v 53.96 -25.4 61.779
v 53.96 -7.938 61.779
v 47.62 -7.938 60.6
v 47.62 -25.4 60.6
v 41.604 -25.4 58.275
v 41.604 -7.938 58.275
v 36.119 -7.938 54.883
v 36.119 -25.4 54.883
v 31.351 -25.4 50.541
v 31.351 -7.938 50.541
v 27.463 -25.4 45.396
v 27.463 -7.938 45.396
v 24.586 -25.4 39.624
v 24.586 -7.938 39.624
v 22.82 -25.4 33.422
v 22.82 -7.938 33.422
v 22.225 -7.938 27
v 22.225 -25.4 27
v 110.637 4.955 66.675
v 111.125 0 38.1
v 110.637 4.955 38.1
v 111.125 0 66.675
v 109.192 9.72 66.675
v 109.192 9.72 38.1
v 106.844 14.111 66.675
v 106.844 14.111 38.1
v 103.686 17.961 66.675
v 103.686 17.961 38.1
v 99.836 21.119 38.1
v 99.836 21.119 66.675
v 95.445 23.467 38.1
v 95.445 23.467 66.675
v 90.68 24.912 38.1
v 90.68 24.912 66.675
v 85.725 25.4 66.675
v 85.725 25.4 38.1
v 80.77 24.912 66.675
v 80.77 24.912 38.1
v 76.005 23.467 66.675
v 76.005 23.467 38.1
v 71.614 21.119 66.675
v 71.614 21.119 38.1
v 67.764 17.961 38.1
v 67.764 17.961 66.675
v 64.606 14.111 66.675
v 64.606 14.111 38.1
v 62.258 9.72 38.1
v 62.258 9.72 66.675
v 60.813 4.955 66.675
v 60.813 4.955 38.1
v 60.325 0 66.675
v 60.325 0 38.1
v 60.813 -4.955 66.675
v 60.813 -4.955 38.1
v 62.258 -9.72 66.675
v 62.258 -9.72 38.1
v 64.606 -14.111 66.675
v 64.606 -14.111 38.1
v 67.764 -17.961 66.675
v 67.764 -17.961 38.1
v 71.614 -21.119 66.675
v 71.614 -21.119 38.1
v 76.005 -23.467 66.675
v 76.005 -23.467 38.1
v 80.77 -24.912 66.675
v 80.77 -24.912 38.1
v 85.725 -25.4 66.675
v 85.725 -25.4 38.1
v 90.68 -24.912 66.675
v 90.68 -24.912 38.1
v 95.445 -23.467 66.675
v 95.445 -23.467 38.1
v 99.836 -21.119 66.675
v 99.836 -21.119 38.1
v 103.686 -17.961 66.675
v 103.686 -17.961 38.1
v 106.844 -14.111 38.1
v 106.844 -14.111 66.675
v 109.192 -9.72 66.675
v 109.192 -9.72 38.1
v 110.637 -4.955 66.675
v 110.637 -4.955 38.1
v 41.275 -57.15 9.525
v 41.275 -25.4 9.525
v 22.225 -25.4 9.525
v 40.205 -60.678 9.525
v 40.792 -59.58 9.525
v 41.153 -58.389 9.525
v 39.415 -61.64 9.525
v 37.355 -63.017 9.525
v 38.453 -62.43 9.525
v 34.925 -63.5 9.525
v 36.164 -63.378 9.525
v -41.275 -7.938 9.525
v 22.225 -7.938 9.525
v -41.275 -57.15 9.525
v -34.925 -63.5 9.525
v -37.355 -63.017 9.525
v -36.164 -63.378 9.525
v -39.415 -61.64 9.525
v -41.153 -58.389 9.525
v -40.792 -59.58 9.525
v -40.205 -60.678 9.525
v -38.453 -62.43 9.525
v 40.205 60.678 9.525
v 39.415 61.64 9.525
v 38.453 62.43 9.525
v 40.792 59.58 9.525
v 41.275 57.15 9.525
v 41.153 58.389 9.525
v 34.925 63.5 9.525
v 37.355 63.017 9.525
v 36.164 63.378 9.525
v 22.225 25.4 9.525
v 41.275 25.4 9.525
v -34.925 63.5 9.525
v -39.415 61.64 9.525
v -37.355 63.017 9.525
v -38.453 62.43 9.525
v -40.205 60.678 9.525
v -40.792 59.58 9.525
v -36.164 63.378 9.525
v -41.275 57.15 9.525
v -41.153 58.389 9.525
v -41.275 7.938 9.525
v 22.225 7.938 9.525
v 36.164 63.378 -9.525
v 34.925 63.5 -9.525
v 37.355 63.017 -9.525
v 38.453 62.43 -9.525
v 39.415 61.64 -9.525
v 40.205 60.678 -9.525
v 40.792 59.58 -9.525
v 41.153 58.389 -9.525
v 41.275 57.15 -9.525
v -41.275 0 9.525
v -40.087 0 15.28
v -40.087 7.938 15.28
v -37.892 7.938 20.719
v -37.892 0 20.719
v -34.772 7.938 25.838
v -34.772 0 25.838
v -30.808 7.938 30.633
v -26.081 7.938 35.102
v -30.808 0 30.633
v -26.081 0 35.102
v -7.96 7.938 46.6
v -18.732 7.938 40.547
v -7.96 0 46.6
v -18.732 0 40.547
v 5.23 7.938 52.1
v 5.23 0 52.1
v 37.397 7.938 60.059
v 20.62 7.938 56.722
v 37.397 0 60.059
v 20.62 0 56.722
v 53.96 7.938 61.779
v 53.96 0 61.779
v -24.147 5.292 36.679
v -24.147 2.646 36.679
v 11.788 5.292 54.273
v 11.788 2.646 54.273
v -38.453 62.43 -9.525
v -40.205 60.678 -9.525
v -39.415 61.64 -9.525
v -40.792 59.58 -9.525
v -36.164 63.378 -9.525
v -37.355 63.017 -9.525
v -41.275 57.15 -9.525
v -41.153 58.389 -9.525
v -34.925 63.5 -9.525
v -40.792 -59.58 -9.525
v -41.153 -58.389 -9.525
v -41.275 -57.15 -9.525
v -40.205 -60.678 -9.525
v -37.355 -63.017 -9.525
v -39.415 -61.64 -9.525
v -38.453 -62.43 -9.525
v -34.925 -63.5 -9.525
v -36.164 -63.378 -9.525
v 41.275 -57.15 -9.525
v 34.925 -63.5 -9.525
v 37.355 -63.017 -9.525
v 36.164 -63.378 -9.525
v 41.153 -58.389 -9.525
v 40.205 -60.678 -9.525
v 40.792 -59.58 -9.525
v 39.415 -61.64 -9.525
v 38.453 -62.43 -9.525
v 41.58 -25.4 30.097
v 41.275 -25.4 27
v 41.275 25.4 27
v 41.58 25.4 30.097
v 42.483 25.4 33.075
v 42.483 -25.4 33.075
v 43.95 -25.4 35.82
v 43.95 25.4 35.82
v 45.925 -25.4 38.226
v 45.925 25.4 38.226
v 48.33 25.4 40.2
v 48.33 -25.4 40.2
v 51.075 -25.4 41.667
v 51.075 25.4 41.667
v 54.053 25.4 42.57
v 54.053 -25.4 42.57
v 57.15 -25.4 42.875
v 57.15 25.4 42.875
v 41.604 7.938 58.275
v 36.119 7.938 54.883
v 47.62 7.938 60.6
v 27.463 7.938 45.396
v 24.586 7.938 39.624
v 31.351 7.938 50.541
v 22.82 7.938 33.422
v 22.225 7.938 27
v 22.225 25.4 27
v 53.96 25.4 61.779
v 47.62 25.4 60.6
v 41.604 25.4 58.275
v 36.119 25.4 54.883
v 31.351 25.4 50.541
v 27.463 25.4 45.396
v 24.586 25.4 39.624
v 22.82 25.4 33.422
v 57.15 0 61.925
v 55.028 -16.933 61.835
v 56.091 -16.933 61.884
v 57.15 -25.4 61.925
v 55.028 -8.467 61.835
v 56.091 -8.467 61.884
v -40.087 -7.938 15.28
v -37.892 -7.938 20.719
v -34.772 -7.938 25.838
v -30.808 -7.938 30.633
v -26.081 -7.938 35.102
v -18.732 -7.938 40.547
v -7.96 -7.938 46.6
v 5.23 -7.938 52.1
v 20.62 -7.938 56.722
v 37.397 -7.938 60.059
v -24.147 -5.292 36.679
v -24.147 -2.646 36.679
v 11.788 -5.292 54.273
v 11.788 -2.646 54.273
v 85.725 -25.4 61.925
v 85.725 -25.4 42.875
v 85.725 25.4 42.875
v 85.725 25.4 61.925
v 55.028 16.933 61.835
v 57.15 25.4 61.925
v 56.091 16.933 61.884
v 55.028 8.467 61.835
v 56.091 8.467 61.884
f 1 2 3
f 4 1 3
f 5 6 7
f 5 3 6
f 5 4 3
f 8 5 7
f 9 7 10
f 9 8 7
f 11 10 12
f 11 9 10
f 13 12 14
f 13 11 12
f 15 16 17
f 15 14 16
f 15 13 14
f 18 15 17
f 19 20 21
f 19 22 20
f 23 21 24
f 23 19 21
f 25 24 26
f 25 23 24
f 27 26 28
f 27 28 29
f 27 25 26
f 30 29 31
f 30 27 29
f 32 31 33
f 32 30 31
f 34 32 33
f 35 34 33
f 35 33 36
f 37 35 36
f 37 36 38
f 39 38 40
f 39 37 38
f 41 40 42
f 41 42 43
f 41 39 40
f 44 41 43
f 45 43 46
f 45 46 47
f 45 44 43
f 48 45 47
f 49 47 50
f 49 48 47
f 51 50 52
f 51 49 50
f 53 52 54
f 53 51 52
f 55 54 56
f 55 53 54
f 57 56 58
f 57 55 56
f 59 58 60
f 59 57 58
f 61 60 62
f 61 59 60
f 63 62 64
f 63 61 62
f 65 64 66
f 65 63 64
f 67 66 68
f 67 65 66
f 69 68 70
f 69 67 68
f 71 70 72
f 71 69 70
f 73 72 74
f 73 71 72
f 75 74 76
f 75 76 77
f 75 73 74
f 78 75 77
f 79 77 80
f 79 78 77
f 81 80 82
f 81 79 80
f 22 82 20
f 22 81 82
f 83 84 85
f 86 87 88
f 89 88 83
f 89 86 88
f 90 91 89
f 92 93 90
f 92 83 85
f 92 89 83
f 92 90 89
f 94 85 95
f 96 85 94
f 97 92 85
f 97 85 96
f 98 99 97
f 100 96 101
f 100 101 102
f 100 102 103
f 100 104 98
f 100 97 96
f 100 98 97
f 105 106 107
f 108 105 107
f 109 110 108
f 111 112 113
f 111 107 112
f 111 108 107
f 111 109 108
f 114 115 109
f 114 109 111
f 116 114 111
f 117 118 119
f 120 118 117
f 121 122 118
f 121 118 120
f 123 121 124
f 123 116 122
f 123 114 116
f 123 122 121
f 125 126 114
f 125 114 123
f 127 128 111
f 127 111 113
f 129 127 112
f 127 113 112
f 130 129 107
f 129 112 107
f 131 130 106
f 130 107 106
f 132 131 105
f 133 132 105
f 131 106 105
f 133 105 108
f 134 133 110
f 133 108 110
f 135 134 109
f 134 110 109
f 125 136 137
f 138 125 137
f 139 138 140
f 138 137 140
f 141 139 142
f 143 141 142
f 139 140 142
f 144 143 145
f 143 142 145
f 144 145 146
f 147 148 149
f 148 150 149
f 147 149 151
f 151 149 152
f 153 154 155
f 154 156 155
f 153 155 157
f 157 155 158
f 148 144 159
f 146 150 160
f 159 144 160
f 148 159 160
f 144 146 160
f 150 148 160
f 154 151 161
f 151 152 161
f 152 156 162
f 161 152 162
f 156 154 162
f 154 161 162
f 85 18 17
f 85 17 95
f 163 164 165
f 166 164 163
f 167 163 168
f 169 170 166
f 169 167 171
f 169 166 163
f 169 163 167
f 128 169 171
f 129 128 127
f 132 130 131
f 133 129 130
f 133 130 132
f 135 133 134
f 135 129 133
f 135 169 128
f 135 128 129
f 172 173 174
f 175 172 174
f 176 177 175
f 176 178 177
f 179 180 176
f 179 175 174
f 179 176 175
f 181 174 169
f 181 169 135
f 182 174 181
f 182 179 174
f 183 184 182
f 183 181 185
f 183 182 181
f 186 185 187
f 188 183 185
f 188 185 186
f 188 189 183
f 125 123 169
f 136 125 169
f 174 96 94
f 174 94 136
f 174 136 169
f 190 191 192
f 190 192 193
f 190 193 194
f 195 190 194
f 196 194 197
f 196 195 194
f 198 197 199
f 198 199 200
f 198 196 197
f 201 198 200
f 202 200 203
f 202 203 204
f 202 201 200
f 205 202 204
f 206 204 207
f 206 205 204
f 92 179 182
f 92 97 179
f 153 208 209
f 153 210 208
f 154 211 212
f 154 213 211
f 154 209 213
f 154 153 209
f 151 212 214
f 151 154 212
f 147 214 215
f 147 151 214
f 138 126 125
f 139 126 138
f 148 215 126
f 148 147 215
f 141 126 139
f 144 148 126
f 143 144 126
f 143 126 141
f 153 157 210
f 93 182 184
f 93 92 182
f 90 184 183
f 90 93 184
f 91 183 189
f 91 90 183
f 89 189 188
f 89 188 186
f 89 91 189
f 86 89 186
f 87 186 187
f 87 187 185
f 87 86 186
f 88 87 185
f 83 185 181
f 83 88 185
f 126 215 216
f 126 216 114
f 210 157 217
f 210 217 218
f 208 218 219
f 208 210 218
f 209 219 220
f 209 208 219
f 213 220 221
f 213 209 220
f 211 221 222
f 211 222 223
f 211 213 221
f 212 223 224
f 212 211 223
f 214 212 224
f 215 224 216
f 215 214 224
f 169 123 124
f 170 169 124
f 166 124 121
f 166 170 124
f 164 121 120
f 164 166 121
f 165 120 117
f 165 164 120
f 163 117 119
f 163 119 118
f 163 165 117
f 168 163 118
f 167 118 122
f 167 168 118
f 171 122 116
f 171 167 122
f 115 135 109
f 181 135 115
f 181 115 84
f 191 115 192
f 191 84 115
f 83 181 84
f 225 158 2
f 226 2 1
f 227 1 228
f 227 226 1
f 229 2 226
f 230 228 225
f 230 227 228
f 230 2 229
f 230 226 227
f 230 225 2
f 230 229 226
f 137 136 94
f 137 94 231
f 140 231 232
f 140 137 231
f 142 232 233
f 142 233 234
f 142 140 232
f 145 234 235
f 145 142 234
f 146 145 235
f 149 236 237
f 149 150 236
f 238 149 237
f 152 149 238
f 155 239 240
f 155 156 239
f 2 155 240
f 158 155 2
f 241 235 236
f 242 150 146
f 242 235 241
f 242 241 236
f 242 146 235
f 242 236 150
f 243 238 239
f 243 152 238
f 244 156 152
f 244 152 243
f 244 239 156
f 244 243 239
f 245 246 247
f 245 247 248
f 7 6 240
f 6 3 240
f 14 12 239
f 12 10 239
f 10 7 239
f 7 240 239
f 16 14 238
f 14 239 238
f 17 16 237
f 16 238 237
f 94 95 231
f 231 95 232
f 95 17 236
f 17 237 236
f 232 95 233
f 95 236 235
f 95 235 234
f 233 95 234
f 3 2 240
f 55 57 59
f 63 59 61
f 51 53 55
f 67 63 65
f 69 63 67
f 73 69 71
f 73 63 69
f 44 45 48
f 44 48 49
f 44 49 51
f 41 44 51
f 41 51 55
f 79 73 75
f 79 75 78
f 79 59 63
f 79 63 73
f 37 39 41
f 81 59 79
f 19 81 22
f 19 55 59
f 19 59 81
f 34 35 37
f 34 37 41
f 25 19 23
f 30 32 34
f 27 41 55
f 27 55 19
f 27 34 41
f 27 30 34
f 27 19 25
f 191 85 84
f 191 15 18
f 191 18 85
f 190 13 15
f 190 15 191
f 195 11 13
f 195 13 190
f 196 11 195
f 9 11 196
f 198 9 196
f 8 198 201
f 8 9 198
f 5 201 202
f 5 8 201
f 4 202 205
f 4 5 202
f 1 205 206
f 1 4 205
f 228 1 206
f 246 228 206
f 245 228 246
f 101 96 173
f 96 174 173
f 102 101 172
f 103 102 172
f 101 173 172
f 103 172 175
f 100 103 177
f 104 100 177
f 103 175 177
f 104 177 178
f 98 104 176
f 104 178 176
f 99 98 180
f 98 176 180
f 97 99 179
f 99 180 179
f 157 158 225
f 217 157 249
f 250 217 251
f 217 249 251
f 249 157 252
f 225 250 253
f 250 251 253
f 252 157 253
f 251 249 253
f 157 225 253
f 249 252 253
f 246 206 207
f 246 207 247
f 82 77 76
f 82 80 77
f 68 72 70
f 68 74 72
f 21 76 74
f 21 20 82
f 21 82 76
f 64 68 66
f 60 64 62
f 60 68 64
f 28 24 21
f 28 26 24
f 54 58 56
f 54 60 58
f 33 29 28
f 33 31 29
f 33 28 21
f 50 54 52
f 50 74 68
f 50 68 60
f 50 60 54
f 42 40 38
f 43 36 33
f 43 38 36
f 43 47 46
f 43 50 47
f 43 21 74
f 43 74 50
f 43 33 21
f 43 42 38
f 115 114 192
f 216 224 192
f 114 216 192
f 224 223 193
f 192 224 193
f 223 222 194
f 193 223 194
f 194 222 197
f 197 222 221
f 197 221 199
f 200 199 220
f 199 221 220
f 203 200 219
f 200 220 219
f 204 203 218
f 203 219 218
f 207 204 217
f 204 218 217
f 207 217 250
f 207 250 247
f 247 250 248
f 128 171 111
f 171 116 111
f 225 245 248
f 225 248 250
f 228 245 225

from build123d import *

# Parameters (mm, degrees)
F1_DEPTH = 63.5
F0_W     = 25.4
F0_H     = 19.05
F2_DEPTH = 25.4
F3_DEPTH = 7.9375
F5_R     = 6.35


with BuildPart() as f1:
    # F0 (on Front) → F1 (new body, symmetric)
    with BuildSketch(Plane.XZ):
        Polygon((-41.275, -9.525), (41.275, -9.525), (41.275, 9.525), (22.225, 9.525), (-41.275, 9.525), align=None)
    extrude(amount=F1_DEPTH, both=True)

    # F0 (on Front) → F2 (join, symmetric)
    with BuildSketch(Plane.XZ):
        with BuildLine():
            Line((22.225, 9.525), (41.275, 9.525))
            Line((41.275, 9.525), (41.275, 27.0002))
            ThreePointArc((41.275, 27.0002), (45.9246798487, 38.2255201513), (57.15, 42.8752))
            Line((57.15, 42.8752), (60.325, 42.8752))
            Line((60.325, 42.8752), (60.325, 61.9252))
            Line((60.325, 61.9252), (57.15, 61.9252))
            add(Edge.make_bspline(
                [(53.9597750069, 61.779189196), (55.0299567924, 61.8386731224), (56.0936979835, 61.887357431), (57.15, 61.9252)],
                knots=[108.6748378897, 108.6748378897, 108.6748378897, 108.6748378897, 111.5045361635, 111.5045361635, 111.5045361635, 111.5045361635], degree=3))
            ThreePointArc((53.9597750069, 61.779189196), (31.3510248955, 50.540983941), (22.225, 27.0002))
            Line((22.225, 27.0002), (22.225, 9.525))
        make_face()
        with Locations((73.025, 52.4002)):
            Rectangle(F0_W, F0_H)
    extrude(amount=F2_DEPTH, both=True)

    # F0 (on Front) → F3 (join, symmetric)
    with BuildSketch(Plane.XZ):
        with BuildLine():
            add(Edge.make_bspline(
                [(-41.275, 9.525), (-37.7406609847, 41.2813045311), (12.85933927, 59.494703206), (53.9597750069, 61.779189196)],
                knots=[0, 0, 0, 0, 108.6748378897, 108.6748378897, 108.6748378897, 108.6748378897], degree=3))
            Line((-41.275, 9.525), (22.225, 9.525))
            Line((22.225, 9.525), (22.225, 27.0002))
            ThreePointArc((22.225, 27.0002), (31.3510248955, 50.540983941), (53.9597750069, 61.779189196))
        make_face()
    extrude(amount=F3_DEPTH, both=True)

    # F5
    f5_edges = [f1.edges().sort_by_distance(p)[0] for p in [
        (41.275, -63.5, 0),
        (-41.275, -63.5, 0),
        (41.275, 63.5, 0),
        (-41.275, 63.5, 0),
    ]]
    fillet(f5_edges, radius=F5_R)


with BuildPart() as f4:
    # F0 (on Front) → F4 (revolve)
    with BuildSketch(Plane.XZ):
        Polygon((85.725, 61.9252), (85.725, 42.8752), (85.725, 38.1), (111.125, 38.1), (111.125, 66.675), (85.725, 66.675), align=None)
    revolve(axis=Axis((85.725, 0, 52.3875), (0, 0, 1)))


solid = Compound([f1.part, f4.part])
